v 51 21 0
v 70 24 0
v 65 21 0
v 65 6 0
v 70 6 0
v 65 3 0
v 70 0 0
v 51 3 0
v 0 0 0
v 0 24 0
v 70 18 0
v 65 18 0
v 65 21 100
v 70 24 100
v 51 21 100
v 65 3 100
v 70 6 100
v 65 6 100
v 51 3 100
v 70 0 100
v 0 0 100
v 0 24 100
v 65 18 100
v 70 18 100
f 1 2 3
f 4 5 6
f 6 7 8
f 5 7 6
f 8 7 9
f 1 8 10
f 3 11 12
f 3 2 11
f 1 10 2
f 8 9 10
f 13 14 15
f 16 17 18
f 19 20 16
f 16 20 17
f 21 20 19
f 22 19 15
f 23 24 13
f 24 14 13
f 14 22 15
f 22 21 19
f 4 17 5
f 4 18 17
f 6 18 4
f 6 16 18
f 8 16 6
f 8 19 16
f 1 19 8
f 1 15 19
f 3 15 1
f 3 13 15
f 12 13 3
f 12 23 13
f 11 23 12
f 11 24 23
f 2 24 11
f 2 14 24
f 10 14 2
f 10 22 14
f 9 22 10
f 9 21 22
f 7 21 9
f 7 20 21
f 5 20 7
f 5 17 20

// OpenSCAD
$fn = 32;

// ----------------------------------------------------------------------
// T-slot rail: 70 x 24 mm section, 100 mm long
// ----------------------------------------------------------------------

// --- parameters (mm) ---
profile_height = 100;     // extrusion height
profile_points = 12;      // points of the closed outline

profile = [[0, 0], [70, 0], [70, 6], [65, 6], [65, 3], [51, 3], [51, 21], [65, 21], [65, 18], [70, 18], [70, 24], [0, 24]];  // single closed polygon, 12 points, counter clockwise

// --- the one profile operation ---
linear_extrude(height = profile_height) polygon(points = profile);
